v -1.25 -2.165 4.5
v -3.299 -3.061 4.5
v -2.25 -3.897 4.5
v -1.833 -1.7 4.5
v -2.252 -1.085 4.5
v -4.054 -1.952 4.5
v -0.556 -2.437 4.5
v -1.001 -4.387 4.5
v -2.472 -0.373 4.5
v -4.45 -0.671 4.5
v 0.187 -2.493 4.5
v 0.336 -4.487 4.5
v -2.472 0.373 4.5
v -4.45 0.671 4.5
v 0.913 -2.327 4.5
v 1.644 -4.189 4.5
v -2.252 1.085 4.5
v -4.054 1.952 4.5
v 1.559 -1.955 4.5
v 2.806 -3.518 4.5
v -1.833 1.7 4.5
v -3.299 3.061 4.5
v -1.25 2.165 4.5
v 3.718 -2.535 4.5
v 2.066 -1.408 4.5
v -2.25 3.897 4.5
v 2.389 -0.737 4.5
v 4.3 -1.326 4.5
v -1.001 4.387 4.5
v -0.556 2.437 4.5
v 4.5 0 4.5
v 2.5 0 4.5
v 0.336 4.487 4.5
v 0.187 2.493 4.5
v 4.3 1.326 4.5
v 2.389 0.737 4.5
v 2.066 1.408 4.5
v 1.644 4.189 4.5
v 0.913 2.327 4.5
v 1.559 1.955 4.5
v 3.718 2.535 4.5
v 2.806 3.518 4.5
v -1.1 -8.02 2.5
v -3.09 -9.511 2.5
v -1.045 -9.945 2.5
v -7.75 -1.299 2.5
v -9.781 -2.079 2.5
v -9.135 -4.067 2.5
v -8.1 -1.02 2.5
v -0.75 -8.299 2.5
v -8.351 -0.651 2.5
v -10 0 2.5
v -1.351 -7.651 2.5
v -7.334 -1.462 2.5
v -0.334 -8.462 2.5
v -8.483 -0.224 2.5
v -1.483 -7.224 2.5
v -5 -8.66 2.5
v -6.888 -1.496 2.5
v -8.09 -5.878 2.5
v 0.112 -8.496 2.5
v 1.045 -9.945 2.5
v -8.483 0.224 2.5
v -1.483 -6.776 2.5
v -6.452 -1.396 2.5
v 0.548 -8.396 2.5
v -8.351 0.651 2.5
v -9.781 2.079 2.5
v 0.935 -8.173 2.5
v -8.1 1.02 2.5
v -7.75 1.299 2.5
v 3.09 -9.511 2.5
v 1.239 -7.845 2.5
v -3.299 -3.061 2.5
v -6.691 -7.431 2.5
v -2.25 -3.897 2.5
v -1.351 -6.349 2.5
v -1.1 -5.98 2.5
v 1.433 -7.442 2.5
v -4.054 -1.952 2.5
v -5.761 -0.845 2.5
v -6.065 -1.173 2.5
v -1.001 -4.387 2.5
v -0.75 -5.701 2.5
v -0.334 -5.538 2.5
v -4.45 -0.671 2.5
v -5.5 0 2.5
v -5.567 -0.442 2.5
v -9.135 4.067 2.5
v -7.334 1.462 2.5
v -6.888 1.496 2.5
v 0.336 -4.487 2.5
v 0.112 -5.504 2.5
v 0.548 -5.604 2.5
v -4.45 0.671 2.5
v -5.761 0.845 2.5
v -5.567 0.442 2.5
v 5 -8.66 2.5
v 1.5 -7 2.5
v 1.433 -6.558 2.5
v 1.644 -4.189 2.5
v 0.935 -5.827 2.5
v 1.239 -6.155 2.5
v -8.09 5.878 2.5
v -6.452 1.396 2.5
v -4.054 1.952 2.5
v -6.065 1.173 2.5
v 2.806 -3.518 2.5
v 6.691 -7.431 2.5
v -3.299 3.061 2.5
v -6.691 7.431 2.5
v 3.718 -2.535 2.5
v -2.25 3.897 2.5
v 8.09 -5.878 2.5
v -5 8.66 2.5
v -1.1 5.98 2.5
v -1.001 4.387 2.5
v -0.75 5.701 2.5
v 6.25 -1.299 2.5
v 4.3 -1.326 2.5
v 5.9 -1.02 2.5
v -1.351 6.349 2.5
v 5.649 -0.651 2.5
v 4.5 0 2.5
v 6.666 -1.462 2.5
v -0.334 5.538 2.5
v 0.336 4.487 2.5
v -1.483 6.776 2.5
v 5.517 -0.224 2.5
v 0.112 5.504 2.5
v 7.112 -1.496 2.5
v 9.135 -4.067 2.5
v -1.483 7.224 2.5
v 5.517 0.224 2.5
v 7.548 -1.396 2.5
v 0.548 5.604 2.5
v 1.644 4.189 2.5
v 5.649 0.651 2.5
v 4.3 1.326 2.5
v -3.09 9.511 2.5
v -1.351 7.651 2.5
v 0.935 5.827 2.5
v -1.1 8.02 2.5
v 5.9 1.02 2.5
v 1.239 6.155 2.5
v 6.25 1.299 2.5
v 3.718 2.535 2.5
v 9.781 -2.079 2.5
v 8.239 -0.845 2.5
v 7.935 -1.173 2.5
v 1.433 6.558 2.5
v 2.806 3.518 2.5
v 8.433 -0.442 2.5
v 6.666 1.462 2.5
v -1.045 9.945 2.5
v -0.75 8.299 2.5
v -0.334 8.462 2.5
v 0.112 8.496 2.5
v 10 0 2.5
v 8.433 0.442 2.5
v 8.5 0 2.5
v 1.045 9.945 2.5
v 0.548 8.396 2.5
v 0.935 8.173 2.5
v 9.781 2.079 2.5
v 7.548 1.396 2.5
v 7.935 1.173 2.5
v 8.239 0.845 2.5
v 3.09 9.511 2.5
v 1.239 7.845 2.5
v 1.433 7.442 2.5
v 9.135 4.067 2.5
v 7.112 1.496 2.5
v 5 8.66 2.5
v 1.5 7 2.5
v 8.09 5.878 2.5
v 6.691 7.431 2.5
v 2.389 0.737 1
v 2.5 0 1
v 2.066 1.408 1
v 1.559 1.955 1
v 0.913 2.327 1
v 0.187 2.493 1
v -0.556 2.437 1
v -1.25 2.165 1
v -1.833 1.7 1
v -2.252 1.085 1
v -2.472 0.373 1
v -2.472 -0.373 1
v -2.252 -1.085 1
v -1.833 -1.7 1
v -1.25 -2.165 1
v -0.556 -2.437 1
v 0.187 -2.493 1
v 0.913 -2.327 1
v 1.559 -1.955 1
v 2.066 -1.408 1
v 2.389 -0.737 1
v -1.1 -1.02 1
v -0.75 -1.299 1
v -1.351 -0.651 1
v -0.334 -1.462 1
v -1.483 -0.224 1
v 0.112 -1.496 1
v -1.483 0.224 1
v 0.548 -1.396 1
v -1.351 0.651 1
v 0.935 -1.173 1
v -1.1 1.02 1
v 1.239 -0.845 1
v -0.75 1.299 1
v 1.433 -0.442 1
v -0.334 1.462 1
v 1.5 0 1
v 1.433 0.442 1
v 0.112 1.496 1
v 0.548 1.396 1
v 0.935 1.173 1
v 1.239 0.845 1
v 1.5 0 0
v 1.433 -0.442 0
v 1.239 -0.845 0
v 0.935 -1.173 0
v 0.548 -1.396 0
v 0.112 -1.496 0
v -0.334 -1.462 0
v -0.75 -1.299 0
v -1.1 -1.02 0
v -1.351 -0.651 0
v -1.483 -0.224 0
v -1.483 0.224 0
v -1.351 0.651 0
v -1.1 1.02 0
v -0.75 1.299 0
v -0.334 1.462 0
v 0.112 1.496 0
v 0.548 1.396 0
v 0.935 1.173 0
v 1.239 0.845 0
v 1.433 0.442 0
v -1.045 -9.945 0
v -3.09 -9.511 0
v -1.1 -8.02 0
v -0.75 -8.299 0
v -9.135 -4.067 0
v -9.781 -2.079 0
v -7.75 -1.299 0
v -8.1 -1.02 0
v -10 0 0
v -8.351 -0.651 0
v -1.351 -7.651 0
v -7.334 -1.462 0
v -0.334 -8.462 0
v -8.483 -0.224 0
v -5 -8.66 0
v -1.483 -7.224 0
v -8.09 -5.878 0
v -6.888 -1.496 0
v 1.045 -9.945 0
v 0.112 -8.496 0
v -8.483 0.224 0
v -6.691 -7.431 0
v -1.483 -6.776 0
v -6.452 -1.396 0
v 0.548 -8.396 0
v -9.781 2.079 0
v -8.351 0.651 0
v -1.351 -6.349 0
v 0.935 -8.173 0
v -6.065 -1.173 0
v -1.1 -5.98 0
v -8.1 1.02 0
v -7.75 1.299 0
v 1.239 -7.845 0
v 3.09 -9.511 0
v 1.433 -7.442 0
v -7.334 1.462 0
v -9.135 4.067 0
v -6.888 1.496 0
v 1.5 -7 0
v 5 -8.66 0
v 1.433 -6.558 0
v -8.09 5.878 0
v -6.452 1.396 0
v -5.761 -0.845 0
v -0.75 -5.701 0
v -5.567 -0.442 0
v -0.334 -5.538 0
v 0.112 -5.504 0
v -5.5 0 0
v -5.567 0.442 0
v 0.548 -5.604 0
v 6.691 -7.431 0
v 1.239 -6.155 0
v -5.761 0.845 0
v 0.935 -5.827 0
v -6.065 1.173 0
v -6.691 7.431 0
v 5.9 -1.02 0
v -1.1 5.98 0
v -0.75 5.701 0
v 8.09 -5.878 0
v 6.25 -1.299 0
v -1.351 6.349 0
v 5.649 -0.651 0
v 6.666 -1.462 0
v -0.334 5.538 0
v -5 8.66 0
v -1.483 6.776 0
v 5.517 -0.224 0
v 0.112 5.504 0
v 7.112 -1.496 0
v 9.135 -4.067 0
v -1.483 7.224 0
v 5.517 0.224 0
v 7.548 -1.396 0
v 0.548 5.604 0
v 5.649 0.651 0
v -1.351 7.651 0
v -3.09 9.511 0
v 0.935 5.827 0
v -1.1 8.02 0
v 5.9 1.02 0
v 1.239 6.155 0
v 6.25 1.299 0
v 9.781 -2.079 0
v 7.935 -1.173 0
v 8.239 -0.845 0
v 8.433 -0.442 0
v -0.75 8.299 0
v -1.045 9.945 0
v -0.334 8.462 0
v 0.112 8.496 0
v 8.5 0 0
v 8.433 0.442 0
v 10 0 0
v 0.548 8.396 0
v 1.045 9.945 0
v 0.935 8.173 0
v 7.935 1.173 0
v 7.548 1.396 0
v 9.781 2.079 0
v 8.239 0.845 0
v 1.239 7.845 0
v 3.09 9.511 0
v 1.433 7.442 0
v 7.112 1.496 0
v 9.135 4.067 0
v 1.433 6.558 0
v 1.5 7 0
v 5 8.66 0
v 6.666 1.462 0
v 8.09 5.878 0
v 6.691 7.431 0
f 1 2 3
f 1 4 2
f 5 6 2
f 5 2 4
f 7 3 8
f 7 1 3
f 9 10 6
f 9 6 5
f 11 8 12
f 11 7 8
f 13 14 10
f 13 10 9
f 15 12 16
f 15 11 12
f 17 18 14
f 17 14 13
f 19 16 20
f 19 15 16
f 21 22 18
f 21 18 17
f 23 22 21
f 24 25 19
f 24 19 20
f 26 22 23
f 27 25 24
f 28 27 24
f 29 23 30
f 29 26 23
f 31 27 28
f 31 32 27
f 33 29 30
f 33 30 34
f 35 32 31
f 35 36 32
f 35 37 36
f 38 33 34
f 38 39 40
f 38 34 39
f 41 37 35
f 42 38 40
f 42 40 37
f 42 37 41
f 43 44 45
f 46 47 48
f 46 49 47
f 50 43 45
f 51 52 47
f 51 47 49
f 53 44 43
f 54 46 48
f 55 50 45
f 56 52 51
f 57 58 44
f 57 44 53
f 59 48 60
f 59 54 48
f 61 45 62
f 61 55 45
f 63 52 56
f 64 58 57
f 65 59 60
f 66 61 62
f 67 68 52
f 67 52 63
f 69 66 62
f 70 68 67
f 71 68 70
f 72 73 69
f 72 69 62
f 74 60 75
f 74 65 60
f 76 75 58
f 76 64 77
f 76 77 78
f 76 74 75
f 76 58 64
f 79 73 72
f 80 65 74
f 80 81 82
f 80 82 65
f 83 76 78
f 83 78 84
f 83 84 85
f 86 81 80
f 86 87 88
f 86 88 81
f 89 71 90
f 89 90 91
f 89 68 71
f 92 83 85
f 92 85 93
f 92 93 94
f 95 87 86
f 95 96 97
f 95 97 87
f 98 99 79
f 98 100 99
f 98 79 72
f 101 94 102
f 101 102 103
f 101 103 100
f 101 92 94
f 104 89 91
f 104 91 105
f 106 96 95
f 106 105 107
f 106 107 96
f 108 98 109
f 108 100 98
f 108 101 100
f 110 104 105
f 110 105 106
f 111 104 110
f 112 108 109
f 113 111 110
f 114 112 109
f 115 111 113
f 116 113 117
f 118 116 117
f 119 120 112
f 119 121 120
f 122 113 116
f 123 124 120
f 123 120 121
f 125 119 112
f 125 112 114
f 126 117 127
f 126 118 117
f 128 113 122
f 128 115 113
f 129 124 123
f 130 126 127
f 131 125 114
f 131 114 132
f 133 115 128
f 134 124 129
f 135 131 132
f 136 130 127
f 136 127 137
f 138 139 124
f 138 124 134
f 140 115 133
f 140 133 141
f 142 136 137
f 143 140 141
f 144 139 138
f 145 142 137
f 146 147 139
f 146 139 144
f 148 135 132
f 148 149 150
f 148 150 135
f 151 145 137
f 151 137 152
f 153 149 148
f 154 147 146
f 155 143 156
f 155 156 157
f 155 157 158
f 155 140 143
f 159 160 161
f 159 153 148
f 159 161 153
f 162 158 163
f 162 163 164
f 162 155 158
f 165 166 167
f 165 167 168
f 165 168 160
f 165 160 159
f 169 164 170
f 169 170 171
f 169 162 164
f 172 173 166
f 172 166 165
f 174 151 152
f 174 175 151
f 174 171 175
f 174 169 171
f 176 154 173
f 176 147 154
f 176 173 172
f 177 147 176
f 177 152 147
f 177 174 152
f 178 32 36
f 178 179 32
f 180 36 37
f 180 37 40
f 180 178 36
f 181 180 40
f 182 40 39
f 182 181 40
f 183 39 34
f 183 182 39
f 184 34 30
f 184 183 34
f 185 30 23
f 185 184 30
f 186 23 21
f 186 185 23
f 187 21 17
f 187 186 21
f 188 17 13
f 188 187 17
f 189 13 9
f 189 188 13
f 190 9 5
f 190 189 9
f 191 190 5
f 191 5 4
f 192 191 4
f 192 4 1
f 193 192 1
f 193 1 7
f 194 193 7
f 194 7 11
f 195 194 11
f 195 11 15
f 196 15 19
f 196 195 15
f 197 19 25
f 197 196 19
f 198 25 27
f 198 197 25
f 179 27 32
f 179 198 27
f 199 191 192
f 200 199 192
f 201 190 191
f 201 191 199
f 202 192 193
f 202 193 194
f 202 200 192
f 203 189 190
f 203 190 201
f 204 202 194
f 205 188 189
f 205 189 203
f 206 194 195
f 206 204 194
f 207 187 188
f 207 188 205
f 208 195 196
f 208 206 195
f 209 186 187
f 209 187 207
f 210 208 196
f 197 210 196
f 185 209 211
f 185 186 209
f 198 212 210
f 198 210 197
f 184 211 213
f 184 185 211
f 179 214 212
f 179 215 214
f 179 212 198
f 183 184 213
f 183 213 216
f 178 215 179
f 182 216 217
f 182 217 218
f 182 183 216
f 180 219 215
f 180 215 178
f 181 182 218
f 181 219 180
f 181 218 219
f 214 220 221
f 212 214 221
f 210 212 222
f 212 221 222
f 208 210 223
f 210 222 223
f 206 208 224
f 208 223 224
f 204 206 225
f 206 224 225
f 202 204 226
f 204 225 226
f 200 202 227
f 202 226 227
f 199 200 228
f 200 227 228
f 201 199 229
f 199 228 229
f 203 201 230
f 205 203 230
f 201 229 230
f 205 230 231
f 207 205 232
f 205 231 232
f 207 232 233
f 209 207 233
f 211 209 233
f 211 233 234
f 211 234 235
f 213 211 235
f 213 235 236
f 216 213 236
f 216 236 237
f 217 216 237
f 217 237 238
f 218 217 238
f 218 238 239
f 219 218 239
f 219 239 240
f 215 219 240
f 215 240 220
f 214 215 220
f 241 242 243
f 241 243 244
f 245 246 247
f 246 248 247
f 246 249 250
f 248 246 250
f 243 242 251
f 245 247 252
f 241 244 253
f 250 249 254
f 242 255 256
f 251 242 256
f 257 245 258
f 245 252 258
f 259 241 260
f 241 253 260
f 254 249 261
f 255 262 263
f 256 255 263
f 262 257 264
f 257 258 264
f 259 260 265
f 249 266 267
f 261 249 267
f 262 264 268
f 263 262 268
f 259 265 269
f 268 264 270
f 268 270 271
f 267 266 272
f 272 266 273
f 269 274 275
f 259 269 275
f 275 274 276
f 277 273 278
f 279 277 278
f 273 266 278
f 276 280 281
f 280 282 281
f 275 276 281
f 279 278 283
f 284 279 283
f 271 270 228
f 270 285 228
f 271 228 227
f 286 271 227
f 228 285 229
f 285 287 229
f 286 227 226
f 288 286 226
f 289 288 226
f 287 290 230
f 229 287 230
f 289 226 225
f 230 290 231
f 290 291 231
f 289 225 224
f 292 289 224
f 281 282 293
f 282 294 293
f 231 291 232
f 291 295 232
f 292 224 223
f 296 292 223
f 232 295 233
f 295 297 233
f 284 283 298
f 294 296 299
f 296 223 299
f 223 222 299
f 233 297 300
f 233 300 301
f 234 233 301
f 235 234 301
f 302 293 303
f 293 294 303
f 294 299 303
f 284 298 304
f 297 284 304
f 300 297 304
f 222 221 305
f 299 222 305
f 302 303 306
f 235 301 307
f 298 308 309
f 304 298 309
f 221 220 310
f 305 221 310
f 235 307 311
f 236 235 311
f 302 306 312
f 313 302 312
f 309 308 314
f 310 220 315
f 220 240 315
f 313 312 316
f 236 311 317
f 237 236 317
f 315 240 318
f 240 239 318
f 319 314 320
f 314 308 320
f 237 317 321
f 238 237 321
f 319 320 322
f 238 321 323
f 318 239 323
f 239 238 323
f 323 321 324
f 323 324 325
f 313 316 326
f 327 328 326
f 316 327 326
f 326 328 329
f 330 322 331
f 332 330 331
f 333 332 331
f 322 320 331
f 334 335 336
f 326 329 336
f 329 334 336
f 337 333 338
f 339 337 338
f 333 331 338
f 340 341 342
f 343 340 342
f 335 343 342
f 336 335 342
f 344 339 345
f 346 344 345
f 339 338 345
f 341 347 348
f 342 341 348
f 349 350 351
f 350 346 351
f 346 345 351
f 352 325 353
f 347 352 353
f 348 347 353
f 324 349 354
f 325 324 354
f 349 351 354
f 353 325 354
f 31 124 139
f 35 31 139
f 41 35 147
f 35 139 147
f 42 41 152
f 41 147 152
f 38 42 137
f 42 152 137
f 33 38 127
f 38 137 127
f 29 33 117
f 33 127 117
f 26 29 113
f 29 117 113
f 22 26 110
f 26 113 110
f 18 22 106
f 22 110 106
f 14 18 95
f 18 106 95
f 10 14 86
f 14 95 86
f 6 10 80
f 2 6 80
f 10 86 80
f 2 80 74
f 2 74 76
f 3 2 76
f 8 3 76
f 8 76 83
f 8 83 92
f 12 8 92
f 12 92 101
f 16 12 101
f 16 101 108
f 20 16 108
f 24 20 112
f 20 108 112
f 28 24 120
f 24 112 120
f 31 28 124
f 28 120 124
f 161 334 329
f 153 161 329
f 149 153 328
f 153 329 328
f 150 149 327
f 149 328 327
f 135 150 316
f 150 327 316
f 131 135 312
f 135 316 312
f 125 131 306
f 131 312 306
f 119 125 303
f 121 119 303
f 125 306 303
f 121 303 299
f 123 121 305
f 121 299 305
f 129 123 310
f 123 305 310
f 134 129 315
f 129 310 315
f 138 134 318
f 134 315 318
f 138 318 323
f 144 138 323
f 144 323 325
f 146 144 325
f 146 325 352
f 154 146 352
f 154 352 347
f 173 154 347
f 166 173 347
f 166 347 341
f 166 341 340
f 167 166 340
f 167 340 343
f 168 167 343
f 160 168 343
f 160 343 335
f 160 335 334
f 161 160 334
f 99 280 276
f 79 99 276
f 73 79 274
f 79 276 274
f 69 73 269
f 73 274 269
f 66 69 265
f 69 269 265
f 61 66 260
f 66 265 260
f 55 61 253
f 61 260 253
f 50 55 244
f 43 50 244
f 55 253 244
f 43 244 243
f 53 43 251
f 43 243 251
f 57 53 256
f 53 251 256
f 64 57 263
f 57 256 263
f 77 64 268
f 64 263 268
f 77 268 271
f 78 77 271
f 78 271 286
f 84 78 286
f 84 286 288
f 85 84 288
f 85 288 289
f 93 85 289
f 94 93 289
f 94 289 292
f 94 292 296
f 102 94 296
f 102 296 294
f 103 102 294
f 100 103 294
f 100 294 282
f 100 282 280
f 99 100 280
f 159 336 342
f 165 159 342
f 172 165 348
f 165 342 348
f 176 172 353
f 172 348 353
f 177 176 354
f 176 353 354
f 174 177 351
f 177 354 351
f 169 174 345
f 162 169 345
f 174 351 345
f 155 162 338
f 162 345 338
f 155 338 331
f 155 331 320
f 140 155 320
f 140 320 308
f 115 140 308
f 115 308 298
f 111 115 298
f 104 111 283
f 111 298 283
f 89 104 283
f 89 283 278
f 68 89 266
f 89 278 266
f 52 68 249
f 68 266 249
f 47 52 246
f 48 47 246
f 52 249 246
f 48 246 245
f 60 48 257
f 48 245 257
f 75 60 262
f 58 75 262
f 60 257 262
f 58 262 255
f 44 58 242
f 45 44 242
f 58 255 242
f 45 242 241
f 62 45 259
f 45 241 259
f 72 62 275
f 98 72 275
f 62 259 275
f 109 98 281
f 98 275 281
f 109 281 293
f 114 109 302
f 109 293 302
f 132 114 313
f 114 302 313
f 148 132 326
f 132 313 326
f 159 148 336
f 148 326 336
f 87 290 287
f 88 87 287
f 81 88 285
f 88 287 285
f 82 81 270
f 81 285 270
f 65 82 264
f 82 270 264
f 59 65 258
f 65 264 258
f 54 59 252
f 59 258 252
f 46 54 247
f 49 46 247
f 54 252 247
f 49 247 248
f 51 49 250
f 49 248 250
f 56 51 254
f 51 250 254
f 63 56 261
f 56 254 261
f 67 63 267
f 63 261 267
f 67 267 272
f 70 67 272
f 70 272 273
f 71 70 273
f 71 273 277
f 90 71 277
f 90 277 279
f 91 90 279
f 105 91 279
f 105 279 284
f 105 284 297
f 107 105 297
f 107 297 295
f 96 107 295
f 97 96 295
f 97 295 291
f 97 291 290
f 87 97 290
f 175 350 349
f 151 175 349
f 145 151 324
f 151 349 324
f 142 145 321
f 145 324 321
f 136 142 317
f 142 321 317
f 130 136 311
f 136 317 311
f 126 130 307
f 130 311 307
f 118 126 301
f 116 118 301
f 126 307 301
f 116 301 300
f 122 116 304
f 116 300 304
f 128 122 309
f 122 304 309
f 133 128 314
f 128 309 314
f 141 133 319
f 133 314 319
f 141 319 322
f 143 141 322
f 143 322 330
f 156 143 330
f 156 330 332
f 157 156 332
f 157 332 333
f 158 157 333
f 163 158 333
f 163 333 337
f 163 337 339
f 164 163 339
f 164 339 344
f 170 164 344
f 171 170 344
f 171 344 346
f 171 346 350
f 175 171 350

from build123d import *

# Parameters (mm, degrees)
F0_R      = 10
F1_DEPTH  = 2.5
F2_R      = 4.5
F2_R_2    = 2.5
F3_DEPTH  = 2
F3_FACE_R = 2.5
F4_DEPTH  = 1.5
F5_R      = 1.5
F6_DEPTH  = 25


with BuildPart() as f1:
    # F0 (on Top) → F1 (new body)
    with BuildSketch(Plane.XY):
        Circle(F0_R)
    extrude(amount=F1_DEPTH)

    # F2 (on face) → F3 (join)
    with BuildSketch(Plane.XY.offset(2.5)):
        Circle(F2_R)
        Circle(F2_R_2, mode=Mode.SUBTRACT)
    extrude(amount=F3_DEPTH)

    # F3_face (on face) → F4 (cut)
    with BuildSketch(Plane.XY.offset(2.5)):
        Circle(F3_FACE_R)
    extrude(amount=-F4_DEPTH, mode=Mode.SUBTRACT)

    # F5 (on face) → F6 (cut)
    with BuildSketch(Plane(origin=(0, 0, 0), x_dir=(1, 0, 0), z_dir=(0, 0, -1))):
        with Locations((-7, 0)):
            Circle(F5_R)
        with Locations((7, 0)):
            Circle(F5_R)
        with Locations((0, -7)):
            Circle(F5_R)
        with Locations((0, 7)):
            Circle(F5_R)
        Circle(F5_R)
    extrude(amount=-F6_DEPTH, mode=Mode.SUBTRACT)


solid = f1.part
